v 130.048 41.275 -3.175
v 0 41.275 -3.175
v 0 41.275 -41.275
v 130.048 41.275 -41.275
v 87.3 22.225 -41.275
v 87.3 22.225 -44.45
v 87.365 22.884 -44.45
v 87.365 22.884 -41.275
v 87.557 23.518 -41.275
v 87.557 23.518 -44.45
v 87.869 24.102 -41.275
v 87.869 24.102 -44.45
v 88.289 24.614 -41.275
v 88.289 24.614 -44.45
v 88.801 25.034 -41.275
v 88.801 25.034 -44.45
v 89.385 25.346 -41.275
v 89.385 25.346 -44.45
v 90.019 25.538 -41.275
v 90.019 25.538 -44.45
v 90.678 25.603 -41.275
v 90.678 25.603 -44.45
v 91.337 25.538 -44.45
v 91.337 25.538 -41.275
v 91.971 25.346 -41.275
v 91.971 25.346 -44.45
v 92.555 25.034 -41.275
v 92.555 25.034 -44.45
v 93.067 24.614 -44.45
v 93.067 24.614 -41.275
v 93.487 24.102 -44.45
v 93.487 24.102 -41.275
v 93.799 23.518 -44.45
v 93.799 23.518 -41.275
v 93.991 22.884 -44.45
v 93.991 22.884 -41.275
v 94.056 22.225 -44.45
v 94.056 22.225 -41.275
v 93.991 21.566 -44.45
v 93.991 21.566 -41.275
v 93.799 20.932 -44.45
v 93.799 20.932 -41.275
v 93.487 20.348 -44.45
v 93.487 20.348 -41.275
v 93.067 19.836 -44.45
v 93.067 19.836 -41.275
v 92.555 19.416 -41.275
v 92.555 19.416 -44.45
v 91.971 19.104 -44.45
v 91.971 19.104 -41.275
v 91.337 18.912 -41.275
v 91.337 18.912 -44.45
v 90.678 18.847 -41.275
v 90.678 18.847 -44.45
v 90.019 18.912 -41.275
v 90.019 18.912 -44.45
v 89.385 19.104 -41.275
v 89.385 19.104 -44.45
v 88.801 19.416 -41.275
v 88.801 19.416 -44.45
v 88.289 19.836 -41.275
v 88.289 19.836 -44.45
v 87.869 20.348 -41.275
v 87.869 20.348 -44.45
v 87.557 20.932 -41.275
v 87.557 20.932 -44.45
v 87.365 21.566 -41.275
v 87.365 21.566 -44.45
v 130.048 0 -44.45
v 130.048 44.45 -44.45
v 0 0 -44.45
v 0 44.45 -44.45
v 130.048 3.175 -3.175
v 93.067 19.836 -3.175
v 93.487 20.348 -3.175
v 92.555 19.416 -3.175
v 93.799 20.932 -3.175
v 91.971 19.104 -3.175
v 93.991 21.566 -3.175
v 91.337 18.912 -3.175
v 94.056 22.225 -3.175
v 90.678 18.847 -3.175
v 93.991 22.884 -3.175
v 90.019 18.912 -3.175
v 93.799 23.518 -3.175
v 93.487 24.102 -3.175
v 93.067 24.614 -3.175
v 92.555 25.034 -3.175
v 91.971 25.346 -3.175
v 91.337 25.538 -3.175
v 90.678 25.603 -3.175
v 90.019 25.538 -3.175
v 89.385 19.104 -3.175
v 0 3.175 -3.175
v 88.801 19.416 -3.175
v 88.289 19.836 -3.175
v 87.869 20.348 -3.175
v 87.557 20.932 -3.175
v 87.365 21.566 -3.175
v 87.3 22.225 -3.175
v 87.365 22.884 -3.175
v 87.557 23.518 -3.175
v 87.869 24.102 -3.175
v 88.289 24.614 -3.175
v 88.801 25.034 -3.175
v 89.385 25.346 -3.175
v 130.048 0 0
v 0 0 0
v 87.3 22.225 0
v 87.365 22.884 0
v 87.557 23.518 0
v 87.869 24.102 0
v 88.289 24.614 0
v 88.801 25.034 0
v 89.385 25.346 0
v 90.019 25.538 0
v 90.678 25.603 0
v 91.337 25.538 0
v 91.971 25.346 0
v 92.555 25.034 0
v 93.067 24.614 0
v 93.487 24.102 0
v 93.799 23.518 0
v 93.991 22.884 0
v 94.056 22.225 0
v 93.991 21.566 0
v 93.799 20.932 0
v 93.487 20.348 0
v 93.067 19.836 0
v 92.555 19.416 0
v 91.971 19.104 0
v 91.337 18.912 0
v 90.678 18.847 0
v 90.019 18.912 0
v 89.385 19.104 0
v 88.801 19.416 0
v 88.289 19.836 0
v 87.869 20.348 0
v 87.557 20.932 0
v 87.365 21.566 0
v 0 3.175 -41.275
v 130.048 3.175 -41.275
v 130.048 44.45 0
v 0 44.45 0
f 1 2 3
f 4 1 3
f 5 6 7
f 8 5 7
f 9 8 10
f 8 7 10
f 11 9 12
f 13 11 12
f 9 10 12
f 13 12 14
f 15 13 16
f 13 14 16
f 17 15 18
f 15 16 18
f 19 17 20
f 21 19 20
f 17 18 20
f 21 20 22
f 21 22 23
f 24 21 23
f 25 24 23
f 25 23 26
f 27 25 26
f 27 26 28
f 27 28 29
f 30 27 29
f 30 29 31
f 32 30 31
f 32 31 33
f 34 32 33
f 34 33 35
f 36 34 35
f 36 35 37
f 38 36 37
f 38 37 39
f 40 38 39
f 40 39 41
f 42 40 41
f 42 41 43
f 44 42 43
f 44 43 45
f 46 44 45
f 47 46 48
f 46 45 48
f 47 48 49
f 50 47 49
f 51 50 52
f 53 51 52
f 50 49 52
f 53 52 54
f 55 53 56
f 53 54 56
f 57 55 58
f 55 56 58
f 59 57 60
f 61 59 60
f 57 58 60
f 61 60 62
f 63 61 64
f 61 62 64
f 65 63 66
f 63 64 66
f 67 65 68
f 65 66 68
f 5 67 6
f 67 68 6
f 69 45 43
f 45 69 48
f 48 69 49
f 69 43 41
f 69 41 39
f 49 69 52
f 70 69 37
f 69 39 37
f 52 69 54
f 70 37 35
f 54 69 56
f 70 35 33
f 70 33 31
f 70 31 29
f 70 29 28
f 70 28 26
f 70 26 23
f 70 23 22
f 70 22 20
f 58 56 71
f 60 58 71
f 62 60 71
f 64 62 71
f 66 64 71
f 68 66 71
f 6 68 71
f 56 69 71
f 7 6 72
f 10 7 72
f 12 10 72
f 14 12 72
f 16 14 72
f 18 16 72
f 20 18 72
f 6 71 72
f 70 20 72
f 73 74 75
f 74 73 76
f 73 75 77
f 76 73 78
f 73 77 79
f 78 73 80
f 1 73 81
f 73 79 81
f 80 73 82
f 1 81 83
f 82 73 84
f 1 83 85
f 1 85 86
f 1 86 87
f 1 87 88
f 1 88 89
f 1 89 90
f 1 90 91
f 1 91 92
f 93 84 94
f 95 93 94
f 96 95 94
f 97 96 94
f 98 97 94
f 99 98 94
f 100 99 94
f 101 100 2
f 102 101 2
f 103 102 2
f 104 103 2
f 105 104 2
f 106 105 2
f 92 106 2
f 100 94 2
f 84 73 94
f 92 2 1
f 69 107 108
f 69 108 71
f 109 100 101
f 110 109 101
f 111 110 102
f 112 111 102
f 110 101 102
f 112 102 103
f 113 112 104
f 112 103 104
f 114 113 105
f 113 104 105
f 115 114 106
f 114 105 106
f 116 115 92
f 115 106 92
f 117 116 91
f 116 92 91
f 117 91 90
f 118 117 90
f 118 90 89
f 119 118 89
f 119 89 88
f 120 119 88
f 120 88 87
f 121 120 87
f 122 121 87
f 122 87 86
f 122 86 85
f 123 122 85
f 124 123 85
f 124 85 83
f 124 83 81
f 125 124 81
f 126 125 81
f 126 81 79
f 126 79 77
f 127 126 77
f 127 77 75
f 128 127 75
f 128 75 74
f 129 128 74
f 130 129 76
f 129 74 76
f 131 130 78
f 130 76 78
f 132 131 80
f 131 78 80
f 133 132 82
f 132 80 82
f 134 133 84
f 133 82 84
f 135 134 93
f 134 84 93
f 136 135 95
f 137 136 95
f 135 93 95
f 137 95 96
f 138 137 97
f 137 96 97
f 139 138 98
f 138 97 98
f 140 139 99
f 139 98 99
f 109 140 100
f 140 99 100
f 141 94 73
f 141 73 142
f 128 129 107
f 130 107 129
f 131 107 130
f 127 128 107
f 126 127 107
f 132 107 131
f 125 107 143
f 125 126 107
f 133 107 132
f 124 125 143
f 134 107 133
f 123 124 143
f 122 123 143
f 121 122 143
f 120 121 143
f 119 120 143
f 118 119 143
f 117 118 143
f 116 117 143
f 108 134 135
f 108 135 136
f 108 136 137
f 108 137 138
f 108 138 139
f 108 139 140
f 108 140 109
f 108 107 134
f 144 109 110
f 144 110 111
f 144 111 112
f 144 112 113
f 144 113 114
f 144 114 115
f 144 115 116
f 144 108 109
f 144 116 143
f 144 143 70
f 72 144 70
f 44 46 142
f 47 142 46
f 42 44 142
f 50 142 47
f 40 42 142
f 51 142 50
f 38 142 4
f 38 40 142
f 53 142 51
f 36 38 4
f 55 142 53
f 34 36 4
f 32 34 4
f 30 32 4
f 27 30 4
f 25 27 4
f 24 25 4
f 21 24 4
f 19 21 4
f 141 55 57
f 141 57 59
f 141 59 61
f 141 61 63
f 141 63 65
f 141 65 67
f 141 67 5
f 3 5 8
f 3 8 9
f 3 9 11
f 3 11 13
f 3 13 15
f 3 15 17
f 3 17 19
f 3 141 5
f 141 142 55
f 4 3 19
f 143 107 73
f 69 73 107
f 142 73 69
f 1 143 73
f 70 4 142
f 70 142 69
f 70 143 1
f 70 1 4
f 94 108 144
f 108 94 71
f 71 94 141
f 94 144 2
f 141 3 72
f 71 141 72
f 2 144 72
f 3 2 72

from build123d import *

# Parameters (mm, degrees)
SKETCH2_W               = 44.45
SKETCH2_H               = 44.45
SKETCH2_W_2             = 38.1
SKETCH2_H_2             = 38.1
BOSS_EXTRUDE1_DEPTH     = 130.048
F_1_4_CLEARANCE_HOLE1_D = 6.7564


with BuildPart() as part:
    # Sketch2 → Boss-Extrude1 (new body)
    with BuildSketch(Plane(origin=(0, 0, 0), x_dir=(0, 0, -1), z_dir=(1, 0, 0))):
        with Locations((22.225, 22.225)):
            Rectangle(SKETCH2_W, SKETCH2_H)
        with Locations((22.225, 22.225)):
            Rectangle(SKETCH2_W_2, SKETCH2_H_2, mode=Mode.SUBTRACT)
    extrude(amount=BOSS_EXTRUDE1_DEPTH)

    # 1/4 Clearance Hole1 (through all)
    with Locations(Plane.XY):
        with Locations((90.678, 22.225)):
            Hole(F_1_4_CLEARANCE_HOLE1_D / 2)


solid = part.part
